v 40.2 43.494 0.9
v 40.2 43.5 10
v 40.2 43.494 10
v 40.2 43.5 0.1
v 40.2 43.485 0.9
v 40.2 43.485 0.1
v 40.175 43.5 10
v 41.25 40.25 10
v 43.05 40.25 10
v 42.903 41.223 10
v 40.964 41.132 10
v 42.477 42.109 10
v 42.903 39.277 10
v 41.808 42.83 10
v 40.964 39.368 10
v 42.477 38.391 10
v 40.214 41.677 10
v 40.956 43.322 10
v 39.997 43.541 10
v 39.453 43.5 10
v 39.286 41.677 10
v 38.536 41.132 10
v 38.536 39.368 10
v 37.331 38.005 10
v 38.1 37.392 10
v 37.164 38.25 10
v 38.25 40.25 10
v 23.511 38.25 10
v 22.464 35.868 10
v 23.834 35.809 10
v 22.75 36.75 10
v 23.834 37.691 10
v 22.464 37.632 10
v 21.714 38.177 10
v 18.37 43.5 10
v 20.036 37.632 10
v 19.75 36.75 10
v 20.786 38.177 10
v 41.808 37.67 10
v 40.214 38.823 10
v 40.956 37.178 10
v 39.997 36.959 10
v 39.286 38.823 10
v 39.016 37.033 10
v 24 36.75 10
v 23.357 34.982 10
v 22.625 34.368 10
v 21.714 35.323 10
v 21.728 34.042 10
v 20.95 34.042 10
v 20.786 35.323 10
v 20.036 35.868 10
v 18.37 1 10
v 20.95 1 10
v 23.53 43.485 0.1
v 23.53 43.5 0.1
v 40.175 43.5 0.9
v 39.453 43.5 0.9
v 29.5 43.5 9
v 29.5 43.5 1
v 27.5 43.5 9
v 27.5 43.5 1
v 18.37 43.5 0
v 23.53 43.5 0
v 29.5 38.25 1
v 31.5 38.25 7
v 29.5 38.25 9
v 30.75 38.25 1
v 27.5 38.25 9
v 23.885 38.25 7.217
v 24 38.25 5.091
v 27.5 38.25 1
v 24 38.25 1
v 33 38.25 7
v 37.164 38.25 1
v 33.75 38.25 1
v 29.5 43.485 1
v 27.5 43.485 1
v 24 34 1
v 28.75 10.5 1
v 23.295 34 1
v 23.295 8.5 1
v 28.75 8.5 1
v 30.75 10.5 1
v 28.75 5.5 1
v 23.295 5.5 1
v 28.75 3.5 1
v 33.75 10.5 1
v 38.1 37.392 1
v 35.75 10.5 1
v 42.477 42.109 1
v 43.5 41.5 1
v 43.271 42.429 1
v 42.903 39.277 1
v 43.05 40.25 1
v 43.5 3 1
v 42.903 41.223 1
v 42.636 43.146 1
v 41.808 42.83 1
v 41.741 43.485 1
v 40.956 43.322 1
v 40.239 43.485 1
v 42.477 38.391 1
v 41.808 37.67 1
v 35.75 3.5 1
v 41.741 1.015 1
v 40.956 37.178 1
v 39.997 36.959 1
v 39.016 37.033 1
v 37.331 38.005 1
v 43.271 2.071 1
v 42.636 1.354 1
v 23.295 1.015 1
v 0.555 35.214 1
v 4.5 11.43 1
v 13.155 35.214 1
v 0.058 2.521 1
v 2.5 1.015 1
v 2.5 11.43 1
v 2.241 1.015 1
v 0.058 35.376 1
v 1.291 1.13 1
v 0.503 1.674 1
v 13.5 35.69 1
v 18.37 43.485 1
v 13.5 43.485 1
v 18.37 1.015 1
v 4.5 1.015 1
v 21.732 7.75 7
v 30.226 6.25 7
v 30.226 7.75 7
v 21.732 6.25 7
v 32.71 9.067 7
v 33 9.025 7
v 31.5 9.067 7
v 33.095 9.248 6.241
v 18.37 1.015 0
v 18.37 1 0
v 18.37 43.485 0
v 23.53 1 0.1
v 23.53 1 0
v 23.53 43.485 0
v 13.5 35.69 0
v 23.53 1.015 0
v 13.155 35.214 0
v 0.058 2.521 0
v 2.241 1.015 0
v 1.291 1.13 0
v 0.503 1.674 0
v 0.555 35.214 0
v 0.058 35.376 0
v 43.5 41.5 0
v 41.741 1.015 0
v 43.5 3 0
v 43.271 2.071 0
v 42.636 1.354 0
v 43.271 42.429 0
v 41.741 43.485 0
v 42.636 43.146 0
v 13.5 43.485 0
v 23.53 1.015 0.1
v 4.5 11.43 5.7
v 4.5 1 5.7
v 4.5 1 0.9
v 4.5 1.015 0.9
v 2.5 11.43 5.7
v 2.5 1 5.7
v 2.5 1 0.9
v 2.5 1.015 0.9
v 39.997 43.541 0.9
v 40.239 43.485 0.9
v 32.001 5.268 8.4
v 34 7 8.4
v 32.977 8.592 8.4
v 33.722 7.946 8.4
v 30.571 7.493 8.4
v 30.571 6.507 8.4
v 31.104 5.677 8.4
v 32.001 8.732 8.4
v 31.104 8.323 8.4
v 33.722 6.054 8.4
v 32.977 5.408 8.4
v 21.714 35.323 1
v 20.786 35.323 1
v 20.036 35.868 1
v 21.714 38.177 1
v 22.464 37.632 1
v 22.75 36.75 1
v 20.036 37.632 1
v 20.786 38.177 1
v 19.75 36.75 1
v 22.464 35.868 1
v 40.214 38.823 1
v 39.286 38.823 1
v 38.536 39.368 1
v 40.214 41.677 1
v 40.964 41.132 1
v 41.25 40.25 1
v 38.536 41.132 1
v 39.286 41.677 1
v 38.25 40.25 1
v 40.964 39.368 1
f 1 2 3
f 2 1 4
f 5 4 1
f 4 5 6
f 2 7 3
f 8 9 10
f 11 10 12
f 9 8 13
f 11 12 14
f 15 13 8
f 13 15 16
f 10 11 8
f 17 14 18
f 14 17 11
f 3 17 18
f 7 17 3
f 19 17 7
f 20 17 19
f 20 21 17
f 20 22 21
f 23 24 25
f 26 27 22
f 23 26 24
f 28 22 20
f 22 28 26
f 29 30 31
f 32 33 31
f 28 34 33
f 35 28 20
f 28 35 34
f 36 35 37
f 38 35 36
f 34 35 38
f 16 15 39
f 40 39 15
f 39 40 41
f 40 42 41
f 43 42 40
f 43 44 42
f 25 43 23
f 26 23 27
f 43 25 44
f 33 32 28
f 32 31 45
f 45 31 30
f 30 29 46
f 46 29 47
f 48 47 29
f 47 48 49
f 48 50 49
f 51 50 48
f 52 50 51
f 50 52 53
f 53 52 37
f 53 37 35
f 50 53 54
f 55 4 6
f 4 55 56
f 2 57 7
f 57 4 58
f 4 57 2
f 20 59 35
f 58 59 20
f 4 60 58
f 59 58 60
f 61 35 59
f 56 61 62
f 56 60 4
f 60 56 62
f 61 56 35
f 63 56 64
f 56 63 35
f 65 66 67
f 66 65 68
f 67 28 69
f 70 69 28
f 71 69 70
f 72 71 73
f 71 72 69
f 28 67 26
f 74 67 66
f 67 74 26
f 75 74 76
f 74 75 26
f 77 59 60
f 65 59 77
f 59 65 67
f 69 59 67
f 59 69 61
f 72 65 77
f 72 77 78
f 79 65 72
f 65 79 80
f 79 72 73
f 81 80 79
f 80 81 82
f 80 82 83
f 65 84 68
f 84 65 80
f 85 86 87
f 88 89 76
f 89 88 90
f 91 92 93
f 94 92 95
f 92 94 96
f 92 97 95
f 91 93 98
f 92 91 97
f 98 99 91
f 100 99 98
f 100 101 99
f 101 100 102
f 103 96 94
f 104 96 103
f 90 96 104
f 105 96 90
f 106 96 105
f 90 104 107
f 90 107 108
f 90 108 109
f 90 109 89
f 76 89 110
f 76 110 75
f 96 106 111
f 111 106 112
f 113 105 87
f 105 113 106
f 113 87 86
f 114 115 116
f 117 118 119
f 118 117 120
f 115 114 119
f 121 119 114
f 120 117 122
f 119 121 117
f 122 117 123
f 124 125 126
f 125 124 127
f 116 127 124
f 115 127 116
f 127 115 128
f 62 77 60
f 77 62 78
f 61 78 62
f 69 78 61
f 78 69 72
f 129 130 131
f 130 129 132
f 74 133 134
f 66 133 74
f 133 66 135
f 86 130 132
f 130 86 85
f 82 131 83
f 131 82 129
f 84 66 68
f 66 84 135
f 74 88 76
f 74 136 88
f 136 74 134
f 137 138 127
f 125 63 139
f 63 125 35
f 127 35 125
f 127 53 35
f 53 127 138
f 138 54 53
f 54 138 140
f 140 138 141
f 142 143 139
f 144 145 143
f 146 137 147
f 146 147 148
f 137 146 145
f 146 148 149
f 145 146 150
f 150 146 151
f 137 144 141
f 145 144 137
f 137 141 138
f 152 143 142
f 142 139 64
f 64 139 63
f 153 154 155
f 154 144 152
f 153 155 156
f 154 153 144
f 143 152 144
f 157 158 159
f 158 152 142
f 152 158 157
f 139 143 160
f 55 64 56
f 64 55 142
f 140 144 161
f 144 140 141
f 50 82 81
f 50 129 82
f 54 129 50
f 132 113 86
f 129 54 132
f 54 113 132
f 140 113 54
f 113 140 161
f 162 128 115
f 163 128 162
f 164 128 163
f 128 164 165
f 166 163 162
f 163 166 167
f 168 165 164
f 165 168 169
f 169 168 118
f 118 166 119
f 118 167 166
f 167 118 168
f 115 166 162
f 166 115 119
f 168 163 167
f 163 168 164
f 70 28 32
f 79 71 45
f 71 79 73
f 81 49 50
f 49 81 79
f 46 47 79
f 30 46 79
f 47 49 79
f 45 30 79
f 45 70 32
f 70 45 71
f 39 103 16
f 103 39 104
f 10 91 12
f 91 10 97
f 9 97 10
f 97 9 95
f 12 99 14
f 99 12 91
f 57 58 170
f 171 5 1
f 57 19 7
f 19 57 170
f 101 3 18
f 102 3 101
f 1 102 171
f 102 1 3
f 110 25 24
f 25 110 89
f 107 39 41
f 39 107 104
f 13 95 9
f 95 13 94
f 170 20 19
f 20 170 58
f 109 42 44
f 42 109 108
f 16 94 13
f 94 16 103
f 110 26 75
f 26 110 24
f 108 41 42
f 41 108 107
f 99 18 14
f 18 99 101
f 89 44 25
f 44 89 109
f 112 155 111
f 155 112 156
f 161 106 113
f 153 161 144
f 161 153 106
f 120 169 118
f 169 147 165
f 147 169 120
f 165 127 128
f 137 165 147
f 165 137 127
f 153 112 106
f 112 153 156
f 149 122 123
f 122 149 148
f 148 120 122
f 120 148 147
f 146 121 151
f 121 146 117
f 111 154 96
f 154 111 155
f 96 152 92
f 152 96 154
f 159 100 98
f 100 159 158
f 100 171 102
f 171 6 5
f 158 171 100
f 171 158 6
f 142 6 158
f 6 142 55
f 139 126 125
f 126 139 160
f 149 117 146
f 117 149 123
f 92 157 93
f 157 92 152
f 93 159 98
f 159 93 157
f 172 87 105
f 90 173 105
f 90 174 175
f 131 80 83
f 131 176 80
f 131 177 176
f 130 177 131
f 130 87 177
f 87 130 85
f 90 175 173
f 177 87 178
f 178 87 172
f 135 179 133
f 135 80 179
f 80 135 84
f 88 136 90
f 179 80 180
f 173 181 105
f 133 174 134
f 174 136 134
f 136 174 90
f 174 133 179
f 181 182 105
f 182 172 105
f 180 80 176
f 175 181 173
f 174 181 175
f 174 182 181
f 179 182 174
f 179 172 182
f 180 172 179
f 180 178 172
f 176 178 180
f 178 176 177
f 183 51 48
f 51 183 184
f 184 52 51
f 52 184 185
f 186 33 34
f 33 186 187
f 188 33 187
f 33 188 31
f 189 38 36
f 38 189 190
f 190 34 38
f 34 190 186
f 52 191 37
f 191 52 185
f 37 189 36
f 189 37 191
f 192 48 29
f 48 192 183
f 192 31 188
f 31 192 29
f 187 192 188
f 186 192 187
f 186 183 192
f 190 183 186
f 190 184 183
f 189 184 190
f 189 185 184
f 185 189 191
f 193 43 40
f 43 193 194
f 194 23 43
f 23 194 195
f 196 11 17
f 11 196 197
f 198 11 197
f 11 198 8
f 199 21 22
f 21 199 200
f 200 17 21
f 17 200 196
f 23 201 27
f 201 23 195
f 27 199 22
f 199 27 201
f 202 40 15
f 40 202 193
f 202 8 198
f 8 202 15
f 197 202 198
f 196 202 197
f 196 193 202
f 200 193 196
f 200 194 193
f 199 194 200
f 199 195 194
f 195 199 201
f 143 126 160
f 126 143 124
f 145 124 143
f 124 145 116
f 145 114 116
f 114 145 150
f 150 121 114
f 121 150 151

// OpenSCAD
hq = true;
clr = 0.2;

$fs = hq ? 1 : 4;
$fa = hq ? 1 : 4;
eps = 0.1;

// Constants from the Eagle file

// Board dimensions
board_x = 0;
board_y = 0;
board_w = 43.5;
board_h = 43.5;
board_r = 2;
board_ne_r = 3.3;
board_min_y = 1;                // screwup: make board 1mm shorter.

// Teensy location
teensy_cx =  9.08;
teensy_cy = 19.05;
teensy_w =  7 * 2.54;
teensy_h = 14 * 2.54;
teensy_paddle_w = 20.75;

// Tactile switches
sw1_x = 32.25;
sw1_y = 7;
swlast_x = sw1_x;
sw_d = 2.5;

// Screw holes
hole1_x = 21.25;
hole1_y = 36.75;

hole2_x = 39.75;
hole2_y = 40.25;

hole_d = 3;
hole_clr = 0;

// Paddles
paddle_y = 3.5;

// Spine
spine_y = 38.25;
spine_cx2 = (37.25 + 48.5) / 2;
spine_cx3 = (58.75 + 66.72) / 2;

// Header
header_cx = 7.79;
header_cy = 39.73;
header_w = 3 * 2.54;
header_h = 2 * 2.54;

// End Eagle constants

teensy_rx = teensy_cx + teensy_w / 2 + clr; // Teensy right side x coord.

// Z heights
base_z = 1;
deck_z = base_z + 9;
sw_z = deck_z - 1.6;
teensy_z = deck_z - 4.1;
bulkhead_z = deck_z - 3;

module centered_cube(size, zt=0) {
    translate([-size[0] / 2, -size[1] / 2, zt])
        cube(size);
}

module round_rect(size, r) {
    hull()
        for (x = [r, size[0] - r]) for ( y = [r, size[1] - r]) {
            translate([x, y, 0])
                cylinder(r=r, h=size[2]);
        }
}


module base() {
    translate([0, board_min_y, 0])
    round_rect([board_w, board_h - board_min_y, base_z], board_r);
}

module spine() {
    lx = teensy_rx + clr;
    difference() {
        translate([lx + eps, spine_y, eps])
            cube([board_w - lx - board_ne_r - eps,
                  board_h - spine_y,
                  deck_z - eps]);
        // strain relief
        translate([board_w - 16, spine_y - eps, base_z])
            cube([2, board_h, deck_z - base_z - 1]);
    }
}

module bulkheads() {
    bt0 = 3;
    bt1 = 1.5;
    bx = teensy_rx + clr;
    by = sw1_y;
    bw = swlast_x - bx;
    bh = board_h - by;
    translate([bx + eps, by, 0])
        hull() {
            translate([0, -bt0/2, base_z - eps])
                cube([bw + bt0/2, bt0, eps]);
            translate([0, -bt1/2, bulkhead_z - eps])
                cube([bw + bt1/2, bt1, eps]);
        }
    translate([bx + bw, board_h, 0])
        rotate(-90)
            hull() {
                translate([eps, -bt0/2, base_z - eps])
                    cube([bh + bt0/2 - eps, bt0, eps]);
                translate([eps, -bt1/2, bulkhead_z - eps])
                    cube([bh + bt1/2 - eps, bt1, eps]);
            }
}

module screw_support(x, y, z) {
    support_d = hole_d + 2.5;
    hull() {
        translate([x, y, base_z - eps])
            centered_cube([support_d, support_d, eps]);
        translate([x, y, z - eps])
            cylinder(d=support_d, h = eps);
    }
}

module end_screw_support(x, y ,z) {
    support_r = board_ne_r;
    translate([x, y, base_z - eps])
        cylinder(r = support_r, h = z - base_z + eps);
}

module screw_supports() {
    screw_support(hole1_x, hole1_y, deck_z);
    end_screw_support(hole2_x, hole2_y, deck_z);
}

module screw_hole(x, y, z) {
    translate([x, y, z])
        cylinder(d=hole_d + hole_clr, h=deck_z + 3);
}

module screw_holes() {
    screw_hole(hole1_x, hole1_y, base_z);
    screw_hole(hole2_x, hole2_y, base_z);
}

module switch_pillars() {
    module switch_pillar(x, y) {
        mbh = 2 * (y - paddle_y);
        mbw = mbh;
        translate([x, y, 0])
            hull() {
                centered_cube([mbw, mbh, eps], zt=base_z - eps);
                translate([0, 0, sw_z - eps])
                    cylinder(d=sw_d + 1, h=eps);
            }
    }
    switch_pillar(sw1_x, sw1_y);
}

module under_teensy() {
    uw = teensy_paddle_w - teensy_rx;
    translate([teensy_rx + clr, board_min_y, 0])
        hull() {
            cube([2 * uw, board_h - board_min_y, eps]);
            translate([0, 0, deck_z - eps])
                cube([uw, board_h - board_min_y, eps]);
        }
    translate([2.5, board_min_y, base_z - eps])
        cube([2, 4.5 * 2.54 - board_min_y, teensy_z - base_z - eps]);
}

module header_cutout() {
    hdr_clr = 2;
    translate([-eps, header_cy - header_h / 2 - hdr_clr, -eps])
        round_rect([header_cx + header_w / 2 + hdr_clr,
                    board_h,
                    deck_z + 2 * eps],
                   r=0.5);
}

module substrate() {
    difference() {
        union() {
            base();
            spine();
            bulkheads();
            switch_pillars();
            under_teensy();
            screw_supports();
        };
        screw_holes();
        header_cutout();
    };
}

substrate();
